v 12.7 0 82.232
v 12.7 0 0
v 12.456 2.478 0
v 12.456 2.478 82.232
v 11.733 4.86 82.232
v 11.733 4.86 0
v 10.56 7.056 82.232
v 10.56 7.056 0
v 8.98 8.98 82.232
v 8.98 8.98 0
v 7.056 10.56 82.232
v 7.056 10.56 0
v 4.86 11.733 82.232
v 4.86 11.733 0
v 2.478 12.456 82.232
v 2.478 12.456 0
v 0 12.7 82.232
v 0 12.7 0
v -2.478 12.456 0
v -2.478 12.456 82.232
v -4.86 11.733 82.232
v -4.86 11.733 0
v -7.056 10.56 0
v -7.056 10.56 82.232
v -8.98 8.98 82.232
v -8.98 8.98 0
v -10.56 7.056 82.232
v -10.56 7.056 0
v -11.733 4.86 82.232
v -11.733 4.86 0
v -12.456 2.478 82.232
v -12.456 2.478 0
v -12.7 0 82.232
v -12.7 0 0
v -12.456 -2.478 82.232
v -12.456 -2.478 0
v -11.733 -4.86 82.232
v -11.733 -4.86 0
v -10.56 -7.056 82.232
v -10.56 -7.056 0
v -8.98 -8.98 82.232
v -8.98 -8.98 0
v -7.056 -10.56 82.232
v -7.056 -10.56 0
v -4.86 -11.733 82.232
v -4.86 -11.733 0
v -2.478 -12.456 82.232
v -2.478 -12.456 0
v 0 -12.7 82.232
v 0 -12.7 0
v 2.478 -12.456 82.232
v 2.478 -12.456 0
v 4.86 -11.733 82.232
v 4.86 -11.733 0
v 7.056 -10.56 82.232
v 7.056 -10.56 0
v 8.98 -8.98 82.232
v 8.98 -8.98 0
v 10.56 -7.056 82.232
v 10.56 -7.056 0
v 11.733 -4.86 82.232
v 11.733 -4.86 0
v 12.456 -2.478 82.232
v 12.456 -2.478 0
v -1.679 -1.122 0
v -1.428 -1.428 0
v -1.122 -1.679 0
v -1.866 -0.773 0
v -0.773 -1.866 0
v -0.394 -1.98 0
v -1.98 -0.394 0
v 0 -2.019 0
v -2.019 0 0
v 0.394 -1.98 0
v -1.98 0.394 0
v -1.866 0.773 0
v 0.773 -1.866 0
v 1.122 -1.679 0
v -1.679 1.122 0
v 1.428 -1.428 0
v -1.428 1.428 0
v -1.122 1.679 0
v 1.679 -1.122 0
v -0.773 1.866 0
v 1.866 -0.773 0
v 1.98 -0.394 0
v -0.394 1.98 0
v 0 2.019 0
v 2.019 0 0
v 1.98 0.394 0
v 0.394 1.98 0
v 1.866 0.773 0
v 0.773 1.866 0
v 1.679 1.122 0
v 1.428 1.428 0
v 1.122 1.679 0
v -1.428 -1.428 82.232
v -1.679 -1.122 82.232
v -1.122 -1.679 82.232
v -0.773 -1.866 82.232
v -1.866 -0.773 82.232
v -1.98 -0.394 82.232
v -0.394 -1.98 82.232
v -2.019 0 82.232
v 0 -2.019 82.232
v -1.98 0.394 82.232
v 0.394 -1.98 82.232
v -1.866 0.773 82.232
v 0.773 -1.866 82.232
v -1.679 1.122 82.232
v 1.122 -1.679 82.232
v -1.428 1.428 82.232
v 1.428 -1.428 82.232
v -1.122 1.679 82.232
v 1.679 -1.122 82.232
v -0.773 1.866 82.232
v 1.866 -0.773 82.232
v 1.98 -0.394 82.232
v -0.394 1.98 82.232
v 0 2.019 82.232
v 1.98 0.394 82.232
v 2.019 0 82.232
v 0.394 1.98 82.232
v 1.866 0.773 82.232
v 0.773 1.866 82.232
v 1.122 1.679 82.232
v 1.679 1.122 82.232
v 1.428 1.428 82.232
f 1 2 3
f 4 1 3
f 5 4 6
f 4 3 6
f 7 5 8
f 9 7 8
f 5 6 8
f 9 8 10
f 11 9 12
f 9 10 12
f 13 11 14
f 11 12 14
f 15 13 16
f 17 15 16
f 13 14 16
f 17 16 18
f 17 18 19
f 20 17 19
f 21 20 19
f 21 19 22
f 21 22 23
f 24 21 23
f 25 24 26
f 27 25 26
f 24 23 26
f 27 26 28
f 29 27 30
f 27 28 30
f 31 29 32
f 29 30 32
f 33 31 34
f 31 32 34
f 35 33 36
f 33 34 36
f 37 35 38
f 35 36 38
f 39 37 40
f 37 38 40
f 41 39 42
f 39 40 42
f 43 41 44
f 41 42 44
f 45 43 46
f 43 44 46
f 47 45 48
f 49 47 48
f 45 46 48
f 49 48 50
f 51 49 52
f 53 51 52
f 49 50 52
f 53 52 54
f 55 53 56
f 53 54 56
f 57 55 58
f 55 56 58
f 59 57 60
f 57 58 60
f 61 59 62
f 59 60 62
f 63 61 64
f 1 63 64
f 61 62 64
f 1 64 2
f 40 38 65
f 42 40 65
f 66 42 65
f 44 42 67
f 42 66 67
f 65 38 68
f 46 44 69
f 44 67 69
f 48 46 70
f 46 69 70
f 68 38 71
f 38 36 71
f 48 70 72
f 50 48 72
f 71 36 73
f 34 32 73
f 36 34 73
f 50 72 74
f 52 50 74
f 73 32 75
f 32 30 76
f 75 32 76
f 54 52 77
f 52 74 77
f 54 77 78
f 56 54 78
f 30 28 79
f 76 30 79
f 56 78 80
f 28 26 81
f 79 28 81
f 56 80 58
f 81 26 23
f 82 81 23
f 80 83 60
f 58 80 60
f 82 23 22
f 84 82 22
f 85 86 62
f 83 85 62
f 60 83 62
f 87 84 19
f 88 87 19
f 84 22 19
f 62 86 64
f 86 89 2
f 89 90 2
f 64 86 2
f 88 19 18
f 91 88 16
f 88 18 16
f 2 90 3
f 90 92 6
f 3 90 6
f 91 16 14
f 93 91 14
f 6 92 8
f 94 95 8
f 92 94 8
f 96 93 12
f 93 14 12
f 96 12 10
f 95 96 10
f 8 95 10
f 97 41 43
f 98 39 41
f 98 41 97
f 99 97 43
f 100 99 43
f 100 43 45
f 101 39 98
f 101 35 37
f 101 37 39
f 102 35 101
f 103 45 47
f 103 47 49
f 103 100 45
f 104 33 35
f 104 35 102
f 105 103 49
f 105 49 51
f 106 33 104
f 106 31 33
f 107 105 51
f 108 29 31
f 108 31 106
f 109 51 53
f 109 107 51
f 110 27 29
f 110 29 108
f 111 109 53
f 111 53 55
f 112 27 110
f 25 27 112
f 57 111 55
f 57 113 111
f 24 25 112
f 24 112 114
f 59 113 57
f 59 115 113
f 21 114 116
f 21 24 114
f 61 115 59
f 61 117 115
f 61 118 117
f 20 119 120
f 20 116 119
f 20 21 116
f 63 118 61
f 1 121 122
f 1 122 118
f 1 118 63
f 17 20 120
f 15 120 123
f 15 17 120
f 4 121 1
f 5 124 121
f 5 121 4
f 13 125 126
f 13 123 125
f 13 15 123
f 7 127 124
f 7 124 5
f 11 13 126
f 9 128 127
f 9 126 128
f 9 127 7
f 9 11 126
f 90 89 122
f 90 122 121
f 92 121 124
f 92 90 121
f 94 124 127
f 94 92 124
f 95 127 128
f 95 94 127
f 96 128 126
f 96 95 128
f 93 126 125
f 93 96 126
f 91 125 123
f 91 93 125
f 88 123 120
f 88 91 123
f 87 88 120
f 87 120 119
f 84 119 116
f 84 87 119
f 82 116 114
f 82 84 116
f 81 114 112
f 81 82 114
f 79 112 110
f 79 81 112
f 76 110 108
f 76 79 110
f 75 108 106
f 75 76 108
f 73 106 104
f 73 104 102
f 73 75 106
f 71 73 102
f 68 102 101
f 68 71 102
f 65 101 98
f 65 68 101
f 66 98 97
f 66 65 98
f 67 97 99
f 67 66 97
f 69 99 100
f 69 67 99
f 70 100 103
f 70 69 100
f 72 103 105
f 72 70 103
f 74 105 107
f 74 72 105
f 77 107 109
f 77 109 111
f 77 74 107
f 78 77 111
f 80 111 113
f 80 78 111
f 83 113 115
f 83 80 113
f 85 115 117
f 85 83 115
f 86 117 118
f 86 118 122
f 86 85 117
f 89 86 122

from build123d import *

# Parameters (mm, degrees)
SKETCH1_R              = 12.7
SKETCH1_R_2            = 2.0193
BOSS_EXTRUDE1_DEPTH    = 82.2325
F_10_32_TAPPED_HOLE1_D = 4.0386
F_10_32_TAPPED_HOLE2_D = 4.0386


with BuildPart() as part:
    # Sketch1 → Boss-Extrude1 (new body)
    with BuildSketch(Plane.XY):
        Circle(SKETCH1_R)
        Circle(SKETCH1_R_2, mode=Mode.SUBTRACT)
    extrude(amount=BOSS_EXTRUDE1_DEPTH)

    # #10-32 Tapped Hole1 (through all)
    with Locations(Plane.XY.offset(82.2325)):
        with Locations((0, 0)):
            Hole(F_10_32_TAPPED_HOLE1_D / 2)

    # #10-32 Tapped Hole2 (through all)
    with Locations(Plane(origin=(0, 0, 0), x_dir=(-1, 0, 0), z_dir=(0, 0, -1))):
        with Locations((0, 0)):
            Hole(F_10_32_TAPPED_HOLE2_D / 2)


solid = part.part
